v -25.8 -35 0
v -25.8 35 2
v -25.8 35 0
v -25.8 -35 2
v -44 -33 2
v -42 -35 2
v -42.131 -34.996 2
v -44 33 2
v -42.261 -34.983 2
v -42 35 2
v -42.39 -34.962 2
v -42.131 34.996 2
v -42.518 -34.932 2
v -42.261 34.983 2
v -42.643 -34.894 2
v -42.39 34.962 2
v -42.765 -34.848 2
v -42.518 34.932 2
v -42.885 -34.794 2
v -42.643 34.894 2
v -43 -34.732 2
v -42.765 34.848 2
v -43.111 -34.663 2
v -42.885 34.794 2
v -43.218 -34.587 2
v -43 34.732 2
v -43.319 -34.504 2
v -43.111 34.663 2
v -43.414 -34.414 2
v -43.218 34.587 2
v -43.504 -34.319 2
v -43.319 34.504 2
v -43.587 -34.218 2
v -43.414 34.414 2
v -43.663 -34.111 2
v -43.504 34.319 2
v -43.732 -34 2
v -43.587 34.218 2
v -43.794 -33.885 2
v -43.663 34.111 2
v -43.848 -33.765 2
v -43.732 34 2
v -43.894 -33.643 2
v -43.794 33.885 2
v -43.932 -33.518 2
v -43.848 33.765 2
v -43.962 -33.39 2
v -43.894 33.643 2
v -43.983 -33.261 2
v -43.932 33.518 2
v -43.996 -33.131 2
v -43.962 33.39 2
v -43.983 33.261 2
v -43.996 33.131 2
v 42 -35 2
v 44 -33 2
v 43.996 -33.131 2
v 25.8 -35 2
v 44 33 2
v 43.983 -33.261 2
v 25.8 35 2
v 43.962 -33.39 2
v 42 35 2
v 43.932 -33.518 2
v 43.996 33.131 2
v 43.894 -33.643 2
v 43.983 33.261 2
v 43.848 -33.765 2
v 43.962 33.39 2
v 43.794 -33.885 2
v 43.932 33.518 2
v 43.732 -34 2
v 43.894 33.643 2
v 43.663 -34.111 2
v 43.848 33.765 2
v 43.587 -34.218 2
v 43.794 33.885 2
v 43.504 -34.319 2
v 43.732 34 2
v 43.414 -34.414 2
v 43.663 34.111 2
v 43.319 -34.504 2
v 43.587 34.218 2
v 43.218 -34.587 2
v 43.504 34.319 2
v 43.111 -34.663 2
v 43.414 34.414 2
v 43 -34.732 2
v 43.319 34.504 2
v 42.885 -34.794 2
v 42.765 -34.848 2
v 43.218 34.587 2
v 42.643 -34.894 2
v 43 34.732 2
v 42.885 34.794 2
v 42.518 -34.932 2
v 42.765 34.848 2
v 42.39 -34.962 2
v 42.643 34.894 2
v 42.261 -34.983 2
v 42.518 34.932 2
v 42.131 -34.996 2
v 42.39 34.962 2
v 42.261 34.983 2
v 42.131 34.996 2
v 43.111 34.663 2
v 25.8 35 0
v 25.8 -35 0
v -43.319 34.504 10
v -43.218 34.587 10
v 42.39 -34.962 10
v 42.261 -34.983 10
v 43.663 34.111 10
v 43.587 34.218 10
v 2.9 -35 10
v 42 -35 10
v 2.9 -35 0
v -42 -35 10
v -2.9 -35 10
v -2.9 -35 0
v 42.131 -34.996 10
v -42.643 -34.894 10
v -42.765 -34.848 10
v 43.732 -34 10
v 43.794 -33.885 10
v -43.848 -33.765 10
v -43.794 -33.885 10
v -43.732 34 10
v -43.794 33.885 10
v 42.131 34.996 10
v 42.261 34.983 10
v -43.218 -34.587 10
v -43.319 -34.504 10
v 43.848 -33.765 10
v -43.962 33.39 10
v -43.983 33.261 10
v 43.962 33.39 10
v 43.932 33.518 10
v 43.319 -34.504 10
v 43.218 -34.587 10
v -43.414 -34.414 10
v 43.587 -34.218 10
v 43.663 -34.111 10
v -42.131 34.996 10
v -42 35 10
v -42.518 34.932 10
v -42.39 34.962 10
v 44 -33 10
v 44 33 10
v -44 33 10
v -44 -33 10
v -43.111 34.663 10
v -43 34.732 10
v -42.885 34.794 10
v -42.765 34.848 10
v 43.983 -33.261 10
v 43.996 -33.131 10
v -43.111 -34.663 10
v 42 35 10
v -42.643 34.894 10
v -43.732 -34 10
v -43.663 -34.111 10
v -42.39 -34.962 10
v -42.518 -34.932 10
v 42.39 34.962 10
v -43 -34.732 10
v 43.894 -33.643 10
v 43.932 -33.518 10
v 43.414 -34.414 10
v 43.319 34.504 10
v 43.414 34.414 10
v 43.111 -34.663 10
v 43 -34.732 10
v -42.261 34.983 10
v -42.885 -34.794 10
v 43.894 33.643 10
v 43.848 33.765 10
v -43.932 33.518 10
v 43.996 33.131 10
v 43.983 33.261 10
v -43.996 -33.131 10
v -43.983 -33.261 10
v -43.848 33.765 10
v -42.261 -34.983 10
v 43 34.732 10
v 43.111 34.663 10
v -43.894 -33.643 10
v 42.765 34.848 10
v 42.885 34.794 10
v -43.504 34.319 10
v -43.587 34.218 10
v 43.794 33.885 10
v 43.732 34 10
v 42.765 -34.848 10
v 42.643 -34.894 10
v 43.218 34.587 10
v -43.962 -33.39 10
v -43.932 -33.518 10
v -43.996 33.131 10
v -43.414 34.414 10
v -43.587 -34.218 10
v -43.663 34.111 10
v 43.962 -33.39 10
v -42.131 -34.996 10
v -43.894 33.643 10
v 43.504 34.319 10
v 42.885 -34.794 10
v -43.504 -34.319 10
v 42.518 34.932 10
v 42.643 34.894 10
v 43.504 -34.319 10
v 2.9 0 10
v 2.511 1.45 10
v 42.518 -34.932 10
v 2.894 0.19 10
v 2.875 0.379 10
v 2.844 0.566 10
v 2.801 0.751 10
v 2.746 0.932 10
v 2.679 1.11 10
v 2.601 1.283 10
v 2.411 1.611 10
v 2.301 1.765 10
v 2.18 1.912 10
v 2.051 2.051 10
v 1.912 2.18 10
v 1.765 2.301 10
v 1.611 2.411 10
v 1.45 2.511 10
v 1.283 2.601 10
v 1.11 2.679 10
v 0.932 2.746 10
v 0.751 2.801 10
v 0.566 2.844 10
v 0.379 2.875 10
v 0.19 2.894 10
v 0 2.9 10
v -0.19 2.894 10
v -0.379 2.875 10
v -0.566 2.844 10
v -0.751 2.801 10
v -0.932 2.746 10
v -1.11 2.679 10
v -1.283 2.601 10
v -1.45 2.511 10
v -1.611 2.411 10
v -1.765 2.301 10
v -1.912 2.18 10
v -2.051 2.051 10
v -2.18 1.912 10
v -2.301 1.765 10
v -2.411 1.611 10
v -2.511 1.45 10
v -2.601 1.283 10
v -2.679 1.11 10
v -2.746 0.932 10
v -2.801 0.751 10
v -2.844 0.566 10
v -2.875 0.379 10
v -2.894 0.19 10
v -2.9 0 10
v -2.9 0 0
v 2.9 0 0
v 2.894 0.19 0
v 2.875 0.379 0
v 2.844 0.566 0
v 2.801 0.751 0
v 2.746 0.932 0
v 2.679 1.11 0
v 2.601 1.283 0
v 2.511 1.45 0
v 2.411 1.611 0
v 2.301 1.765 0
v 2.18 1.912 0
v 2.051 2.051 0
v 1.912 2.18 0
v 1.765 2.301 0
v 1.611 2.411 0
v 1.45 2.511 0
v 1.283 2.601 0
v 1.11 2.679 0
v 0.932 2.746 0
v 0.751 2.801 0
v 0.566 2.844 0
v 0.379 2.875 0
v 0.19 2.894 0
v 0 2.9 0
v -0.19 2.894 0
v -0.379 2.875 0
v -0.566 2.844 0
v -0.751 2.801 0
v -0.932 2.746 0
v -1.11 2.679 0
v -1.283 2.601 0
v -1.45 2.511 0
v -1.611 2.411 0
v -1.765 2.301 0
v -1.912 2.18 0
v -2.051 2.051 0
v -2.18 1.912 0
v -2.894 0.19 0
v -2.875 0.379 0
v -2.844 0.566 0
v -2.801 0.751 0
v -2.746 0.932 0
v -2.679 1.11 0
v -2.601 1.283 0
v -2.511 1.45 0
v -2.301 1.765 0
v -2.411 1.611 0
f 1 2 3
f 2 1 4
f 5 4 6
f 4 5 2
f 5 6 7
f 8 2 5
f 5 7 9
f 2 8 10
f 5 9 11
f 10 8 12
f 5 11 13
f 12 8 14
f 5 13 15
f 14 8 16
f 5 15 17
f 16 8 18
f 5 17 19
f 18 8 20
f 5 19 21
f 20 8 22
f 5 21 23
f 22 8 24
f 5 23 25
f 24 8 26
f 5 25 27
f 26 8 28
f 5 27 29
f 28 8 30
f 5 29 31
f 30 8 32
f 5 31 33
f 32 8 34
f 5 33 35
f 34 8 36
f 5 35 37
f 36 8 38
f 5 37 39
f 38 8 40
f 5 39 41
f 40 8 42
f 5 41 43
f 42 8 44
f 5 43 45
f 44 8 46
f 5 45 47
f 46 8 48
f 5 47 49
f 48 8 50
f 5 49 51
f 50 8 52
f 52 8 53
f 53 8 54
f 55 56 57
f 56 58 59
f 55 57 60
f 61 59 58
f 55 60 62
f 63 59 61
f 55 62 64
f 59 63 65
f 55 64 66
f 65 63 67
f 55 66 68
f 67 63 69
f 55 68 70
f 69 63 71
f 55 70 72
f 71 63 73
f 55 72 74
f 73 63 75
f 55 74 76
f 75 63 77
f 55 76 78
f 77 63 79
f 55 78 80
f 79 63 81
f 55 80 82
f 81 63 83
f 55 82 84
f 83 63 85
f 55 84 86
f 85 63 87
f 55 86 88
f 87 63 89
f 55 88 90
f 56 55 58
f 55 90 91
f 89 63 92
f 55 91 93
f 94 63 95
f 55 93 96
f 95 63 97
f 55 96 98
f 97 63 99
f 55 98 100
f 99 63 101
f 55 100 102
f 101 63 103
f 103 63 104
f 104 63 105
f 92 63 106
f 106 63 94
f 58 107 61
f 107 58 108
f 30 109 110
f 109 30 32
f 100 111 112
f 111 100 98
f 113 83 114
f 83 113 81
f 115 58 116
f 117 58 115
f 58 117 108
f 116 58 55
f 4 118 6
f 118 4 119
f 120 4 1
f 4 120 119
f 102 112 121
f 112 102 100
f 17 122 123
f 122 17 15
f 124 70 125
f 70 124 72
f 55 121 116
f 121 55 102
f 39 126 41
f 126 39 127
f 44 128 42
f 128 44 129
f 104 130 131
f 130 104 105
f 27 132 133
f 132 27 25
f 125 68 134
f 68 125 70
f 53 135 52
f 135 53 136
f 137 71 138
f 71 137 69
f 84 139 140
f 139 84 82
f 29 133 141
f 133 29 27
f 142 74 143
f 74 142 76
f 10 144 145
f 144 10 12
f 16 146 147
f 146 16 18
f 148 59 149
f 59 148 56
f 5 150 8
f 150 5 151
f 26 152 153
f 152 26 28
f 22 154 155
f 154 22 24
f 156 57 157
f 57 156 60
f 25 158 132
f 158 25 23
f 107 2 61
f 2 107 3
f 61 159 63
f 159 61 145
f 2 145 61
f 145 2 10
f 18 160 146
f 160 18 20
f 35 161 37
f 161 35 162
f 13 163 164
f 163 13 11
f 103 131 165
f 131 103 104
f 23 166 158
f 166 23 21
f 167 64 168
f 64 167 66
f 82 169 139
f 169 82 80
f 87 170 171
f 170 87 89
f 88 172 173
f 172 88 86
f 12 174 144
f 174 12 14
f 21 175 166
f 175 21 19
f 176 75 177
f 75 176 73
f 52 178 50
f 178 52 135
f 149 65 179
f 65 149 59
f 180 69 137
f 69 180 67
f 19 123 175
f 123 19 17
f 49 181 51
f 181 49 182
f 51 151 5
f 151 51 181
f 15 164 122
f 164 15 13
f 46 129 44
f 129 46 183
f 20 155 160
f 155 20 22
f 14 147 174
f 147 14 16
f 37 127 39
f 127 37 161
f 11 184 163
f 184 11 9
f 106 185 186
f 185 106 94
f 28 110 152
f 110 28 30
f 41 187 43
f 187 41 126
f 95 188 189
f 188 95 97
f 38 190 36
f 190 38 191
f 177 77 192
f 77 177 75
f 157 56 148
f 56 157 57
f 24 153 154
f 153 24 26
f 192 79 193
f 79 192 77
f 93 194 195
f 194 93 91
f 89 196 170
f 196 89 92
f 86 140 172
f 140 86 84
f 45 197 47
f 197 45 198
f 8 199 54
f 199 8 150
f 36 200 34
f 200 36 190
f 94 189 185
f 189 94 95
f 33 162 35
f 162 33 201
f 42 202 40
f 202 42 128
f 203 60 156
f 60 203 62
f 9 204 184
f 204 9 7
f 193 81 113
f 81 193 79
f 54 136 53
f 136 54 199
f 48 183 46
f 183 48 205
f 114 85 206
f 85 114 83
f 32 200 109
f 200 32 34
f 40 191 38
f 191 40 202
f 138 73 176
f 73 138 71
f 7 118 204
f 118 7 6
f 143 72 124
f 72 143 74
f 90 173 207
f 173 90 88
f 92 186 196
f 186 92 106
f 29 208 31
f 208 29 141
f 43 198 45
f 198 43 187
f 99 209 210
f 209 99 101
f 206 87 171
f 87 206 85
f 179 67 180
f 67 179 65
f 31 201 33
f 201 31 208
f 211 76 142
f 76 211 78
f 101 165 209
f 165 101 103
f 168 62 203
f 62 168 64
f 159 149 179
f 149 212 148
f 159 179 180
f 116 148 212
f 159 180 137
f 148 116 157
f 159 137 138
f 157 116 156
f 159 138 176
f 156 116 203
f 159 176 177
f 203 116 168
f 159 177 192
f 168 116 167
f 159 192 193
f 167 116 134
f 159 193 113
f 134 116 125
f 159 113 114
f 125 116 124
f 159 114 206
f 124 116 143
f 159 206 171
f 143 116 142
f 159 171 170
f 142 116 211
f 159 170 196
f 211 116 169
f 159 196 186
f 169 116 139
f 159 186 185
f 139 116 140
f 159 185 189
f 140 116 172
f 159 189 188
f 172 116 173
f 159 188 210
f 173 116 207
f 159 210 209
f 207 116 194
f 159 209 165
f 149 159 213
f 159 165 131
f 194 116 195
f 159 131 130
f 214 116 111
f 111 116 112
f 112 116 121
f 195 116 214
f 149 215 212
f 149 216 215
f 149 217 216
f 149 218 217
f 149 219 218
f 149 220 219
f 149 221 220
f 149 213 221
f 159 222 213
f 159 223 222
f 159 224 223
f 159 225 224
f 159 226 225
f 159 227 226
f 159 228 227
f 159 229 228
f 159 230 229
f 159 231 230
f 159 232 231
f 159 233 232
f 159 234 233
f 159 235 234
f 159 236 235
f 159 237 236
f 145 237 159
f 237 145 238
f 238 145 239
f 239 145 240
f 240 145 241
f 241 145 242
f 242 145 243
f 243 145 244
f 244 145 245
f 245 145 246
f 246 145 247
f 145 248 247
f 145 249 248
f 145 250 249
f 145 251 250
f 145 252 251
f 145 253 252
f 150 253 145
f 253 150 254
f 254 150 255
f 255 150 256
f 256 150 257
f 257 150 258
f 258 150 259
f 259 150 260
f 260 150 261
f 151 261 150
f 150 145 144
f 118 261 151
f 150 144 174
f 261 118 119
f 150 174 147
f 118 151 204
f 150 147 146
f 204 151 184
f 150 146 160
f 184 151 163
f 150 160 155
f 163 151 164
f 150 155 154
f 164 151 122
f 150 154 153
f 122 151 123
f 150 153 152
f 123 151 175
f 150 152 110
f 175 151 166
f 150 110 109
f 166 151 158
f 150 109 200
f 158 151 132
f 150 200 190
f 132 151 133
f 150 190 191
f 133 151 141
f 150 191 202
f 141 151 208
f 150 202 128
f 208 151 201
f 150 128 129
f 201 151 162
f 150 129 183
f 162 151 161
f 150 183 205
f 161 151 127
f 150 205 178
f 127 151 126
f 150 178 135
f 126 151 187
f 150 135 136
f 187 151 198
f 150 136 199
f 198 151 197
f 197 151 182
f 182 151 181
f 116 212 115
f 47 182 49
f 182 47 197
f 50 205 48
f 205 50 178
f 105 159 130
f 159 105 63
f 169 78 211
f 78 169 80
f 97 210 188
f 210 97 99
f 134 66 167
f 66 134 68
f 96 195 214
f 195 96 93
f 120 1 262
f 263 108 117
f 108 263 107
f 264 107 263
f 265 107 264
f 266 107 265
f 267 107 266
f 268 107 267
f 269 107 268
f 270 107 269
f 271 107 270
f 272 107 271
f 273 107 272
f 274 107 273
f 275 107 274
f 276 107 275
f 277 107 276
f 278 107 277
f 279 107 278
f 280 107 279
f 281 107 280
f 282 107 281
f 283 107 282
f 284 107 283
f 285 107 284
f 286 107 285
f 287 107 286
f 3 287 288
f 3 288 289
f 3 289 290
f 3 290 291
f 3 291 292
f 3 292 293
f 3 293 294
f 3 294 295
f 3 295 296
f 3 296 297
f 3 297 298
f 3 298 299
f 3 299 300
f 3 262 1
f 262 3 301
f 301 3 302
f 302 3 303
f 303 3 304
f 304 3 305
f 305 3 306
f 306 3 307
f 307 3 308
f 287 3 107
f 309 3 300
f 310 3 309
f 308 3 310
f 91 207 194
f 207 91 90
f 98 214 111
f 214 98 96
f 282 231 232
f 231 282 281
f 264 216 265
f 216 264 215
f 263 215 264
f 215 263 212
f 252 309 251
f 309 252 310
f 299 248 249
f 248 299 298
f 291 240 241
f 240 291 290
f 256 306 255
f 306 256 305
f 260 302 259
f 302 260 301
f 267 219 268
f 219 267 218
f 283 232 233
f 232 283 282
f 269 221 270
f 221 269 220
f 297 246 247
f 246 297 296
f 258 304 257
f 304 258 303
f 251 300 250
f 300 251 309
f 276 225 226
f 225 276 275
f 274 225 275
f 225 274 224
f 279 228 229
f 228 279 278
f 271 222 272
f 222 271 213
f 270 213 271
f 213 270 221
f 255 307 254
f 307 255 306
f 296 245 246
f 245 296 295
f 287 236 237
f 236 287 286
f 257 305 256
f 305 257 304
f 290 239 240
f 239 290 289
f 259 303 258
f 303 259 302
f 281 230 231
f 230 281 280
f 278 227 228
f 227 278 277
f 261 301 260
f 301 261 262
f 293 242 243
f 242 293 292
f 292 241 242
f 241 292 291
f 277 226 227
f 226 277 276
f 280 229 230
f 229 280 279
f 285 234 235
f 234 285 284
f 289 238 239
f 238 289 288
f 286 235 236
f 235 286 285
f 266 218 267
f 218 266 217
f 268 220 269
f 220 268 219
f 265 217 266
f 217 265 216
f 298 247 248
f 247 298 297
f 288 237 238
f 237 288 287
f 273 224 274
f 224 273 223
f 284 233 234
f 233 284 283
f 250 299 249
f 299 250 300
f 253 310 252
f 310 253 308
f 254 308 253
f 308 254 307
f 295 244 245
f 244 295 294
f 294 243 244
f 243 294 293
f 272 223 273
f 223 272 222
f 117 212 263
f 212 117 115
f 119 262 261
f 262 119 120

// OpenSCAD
// NEMA17 press-tool prototypes. Dimensions in mm. No load rating.
// Export: openscad -D 'part="platform_5p8"' -o output.stl press-kit.scad
// Change shaft_d and regenerate the entire set for another shaft.
$fn=96;
shaft_d=5;
part="platform_5p8";
slot_clearance=0.8;
plate_w=88; plate_d=70; plate_h=10;
foot_w=18; foot_h=65; foot_x=35;
module rounded_box(w,d,h,r=2){
 linear_extrude(h) offset(r=r) square([w-2*r,d-2*r],center=true);
}
module platform(slot){
 difference(){
  rounded_box(plate_w,plate_d,plate_h);
  translate([0,0,-1]) cylinder(d=slot,h=plate_h+2);
  translate([-slot/2,-plate_d/2-1,-1]) cube([slot,plate_d/2+1,plate_h+2]);
  // Underside seats locate the two separate risers; 0.4 mm total clearance.
  for(x=[-foot_x,foot_x]) translate([x-(foot_w+0.4)/2,-plate_d/2-1,-1]) cube([foot_w+0.4,plate_d+2,3]);
 }
}
module punch(reach){
 union(){
  cylinder(d=20,h=8);
  translate([0,0,8]) cylinder(d1=20,d2=shaft_d-0.6,h=4);
  translate([0,0,12]) cylinder(d=shaft_d-0.6,h=reach);
 }
}
module guide(){
 difference(){
  union(){cylinder(d=28,h=5);translate([0,0,5]) cylinder(d1=28,d2=18,h=5);translate([0,0,10]) cylinder(d=18,h=18);}
  translate([0,0,-1]) cylinder(d=4.3,h=30);
 }
}
if(part=="platform_5p8") platform(shaft_d+slot_clearance);
if(part=="platform_8p4") platform(8.4);
if(part=="platform_12p4") platform(12.4);
if(part=="punch_05") punch(5);
if(part=="punch_10") punch(10);
if(part=="punch_15") punch(15);
if(part=="riser") rounded_box(foot_w,plate_d,foot_h,1.5);
if(part=="steel_guide") guide();
